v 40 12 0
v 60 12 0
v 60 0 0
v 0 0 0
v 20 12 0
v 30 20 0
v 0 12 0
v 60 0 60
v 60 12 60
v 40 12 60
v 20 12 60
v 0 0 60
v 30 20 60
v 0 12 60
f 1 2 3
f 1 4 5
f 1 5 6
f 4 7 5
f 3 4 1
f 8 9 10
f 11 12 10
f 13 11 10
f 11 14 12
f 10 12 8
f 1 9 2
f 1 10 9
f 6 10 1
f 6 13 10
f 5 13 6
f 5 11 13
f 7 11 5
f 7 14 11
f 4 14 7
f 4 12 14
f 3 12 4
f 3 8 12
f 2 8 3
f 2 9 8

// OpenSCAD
$fn = 32;

// ----------------------------------------------------------------------
// V guide rail: vrib, 60 mm wide
// ----------------------------------------------------------------------

// --- parameters (mm) ---
rail_w = 60;              // rail width, X
base_t = 12;              // base plate thickness
v_depth = 8;              // V feature depth / height
v_half_w = 10;            // half width of the V at the base face
plate_t = 60;             // rail length, Z (the extrusion height)

profile = [[0, 0], [60, 0], [60, 12], [40, 12], [30, 20], [20, 12], [0, 12]];  // primary outline, 7 points, counter clockwise

// --- the one profile operation ---
linear_extrude(height = plate_t) polygon(points = profile);
